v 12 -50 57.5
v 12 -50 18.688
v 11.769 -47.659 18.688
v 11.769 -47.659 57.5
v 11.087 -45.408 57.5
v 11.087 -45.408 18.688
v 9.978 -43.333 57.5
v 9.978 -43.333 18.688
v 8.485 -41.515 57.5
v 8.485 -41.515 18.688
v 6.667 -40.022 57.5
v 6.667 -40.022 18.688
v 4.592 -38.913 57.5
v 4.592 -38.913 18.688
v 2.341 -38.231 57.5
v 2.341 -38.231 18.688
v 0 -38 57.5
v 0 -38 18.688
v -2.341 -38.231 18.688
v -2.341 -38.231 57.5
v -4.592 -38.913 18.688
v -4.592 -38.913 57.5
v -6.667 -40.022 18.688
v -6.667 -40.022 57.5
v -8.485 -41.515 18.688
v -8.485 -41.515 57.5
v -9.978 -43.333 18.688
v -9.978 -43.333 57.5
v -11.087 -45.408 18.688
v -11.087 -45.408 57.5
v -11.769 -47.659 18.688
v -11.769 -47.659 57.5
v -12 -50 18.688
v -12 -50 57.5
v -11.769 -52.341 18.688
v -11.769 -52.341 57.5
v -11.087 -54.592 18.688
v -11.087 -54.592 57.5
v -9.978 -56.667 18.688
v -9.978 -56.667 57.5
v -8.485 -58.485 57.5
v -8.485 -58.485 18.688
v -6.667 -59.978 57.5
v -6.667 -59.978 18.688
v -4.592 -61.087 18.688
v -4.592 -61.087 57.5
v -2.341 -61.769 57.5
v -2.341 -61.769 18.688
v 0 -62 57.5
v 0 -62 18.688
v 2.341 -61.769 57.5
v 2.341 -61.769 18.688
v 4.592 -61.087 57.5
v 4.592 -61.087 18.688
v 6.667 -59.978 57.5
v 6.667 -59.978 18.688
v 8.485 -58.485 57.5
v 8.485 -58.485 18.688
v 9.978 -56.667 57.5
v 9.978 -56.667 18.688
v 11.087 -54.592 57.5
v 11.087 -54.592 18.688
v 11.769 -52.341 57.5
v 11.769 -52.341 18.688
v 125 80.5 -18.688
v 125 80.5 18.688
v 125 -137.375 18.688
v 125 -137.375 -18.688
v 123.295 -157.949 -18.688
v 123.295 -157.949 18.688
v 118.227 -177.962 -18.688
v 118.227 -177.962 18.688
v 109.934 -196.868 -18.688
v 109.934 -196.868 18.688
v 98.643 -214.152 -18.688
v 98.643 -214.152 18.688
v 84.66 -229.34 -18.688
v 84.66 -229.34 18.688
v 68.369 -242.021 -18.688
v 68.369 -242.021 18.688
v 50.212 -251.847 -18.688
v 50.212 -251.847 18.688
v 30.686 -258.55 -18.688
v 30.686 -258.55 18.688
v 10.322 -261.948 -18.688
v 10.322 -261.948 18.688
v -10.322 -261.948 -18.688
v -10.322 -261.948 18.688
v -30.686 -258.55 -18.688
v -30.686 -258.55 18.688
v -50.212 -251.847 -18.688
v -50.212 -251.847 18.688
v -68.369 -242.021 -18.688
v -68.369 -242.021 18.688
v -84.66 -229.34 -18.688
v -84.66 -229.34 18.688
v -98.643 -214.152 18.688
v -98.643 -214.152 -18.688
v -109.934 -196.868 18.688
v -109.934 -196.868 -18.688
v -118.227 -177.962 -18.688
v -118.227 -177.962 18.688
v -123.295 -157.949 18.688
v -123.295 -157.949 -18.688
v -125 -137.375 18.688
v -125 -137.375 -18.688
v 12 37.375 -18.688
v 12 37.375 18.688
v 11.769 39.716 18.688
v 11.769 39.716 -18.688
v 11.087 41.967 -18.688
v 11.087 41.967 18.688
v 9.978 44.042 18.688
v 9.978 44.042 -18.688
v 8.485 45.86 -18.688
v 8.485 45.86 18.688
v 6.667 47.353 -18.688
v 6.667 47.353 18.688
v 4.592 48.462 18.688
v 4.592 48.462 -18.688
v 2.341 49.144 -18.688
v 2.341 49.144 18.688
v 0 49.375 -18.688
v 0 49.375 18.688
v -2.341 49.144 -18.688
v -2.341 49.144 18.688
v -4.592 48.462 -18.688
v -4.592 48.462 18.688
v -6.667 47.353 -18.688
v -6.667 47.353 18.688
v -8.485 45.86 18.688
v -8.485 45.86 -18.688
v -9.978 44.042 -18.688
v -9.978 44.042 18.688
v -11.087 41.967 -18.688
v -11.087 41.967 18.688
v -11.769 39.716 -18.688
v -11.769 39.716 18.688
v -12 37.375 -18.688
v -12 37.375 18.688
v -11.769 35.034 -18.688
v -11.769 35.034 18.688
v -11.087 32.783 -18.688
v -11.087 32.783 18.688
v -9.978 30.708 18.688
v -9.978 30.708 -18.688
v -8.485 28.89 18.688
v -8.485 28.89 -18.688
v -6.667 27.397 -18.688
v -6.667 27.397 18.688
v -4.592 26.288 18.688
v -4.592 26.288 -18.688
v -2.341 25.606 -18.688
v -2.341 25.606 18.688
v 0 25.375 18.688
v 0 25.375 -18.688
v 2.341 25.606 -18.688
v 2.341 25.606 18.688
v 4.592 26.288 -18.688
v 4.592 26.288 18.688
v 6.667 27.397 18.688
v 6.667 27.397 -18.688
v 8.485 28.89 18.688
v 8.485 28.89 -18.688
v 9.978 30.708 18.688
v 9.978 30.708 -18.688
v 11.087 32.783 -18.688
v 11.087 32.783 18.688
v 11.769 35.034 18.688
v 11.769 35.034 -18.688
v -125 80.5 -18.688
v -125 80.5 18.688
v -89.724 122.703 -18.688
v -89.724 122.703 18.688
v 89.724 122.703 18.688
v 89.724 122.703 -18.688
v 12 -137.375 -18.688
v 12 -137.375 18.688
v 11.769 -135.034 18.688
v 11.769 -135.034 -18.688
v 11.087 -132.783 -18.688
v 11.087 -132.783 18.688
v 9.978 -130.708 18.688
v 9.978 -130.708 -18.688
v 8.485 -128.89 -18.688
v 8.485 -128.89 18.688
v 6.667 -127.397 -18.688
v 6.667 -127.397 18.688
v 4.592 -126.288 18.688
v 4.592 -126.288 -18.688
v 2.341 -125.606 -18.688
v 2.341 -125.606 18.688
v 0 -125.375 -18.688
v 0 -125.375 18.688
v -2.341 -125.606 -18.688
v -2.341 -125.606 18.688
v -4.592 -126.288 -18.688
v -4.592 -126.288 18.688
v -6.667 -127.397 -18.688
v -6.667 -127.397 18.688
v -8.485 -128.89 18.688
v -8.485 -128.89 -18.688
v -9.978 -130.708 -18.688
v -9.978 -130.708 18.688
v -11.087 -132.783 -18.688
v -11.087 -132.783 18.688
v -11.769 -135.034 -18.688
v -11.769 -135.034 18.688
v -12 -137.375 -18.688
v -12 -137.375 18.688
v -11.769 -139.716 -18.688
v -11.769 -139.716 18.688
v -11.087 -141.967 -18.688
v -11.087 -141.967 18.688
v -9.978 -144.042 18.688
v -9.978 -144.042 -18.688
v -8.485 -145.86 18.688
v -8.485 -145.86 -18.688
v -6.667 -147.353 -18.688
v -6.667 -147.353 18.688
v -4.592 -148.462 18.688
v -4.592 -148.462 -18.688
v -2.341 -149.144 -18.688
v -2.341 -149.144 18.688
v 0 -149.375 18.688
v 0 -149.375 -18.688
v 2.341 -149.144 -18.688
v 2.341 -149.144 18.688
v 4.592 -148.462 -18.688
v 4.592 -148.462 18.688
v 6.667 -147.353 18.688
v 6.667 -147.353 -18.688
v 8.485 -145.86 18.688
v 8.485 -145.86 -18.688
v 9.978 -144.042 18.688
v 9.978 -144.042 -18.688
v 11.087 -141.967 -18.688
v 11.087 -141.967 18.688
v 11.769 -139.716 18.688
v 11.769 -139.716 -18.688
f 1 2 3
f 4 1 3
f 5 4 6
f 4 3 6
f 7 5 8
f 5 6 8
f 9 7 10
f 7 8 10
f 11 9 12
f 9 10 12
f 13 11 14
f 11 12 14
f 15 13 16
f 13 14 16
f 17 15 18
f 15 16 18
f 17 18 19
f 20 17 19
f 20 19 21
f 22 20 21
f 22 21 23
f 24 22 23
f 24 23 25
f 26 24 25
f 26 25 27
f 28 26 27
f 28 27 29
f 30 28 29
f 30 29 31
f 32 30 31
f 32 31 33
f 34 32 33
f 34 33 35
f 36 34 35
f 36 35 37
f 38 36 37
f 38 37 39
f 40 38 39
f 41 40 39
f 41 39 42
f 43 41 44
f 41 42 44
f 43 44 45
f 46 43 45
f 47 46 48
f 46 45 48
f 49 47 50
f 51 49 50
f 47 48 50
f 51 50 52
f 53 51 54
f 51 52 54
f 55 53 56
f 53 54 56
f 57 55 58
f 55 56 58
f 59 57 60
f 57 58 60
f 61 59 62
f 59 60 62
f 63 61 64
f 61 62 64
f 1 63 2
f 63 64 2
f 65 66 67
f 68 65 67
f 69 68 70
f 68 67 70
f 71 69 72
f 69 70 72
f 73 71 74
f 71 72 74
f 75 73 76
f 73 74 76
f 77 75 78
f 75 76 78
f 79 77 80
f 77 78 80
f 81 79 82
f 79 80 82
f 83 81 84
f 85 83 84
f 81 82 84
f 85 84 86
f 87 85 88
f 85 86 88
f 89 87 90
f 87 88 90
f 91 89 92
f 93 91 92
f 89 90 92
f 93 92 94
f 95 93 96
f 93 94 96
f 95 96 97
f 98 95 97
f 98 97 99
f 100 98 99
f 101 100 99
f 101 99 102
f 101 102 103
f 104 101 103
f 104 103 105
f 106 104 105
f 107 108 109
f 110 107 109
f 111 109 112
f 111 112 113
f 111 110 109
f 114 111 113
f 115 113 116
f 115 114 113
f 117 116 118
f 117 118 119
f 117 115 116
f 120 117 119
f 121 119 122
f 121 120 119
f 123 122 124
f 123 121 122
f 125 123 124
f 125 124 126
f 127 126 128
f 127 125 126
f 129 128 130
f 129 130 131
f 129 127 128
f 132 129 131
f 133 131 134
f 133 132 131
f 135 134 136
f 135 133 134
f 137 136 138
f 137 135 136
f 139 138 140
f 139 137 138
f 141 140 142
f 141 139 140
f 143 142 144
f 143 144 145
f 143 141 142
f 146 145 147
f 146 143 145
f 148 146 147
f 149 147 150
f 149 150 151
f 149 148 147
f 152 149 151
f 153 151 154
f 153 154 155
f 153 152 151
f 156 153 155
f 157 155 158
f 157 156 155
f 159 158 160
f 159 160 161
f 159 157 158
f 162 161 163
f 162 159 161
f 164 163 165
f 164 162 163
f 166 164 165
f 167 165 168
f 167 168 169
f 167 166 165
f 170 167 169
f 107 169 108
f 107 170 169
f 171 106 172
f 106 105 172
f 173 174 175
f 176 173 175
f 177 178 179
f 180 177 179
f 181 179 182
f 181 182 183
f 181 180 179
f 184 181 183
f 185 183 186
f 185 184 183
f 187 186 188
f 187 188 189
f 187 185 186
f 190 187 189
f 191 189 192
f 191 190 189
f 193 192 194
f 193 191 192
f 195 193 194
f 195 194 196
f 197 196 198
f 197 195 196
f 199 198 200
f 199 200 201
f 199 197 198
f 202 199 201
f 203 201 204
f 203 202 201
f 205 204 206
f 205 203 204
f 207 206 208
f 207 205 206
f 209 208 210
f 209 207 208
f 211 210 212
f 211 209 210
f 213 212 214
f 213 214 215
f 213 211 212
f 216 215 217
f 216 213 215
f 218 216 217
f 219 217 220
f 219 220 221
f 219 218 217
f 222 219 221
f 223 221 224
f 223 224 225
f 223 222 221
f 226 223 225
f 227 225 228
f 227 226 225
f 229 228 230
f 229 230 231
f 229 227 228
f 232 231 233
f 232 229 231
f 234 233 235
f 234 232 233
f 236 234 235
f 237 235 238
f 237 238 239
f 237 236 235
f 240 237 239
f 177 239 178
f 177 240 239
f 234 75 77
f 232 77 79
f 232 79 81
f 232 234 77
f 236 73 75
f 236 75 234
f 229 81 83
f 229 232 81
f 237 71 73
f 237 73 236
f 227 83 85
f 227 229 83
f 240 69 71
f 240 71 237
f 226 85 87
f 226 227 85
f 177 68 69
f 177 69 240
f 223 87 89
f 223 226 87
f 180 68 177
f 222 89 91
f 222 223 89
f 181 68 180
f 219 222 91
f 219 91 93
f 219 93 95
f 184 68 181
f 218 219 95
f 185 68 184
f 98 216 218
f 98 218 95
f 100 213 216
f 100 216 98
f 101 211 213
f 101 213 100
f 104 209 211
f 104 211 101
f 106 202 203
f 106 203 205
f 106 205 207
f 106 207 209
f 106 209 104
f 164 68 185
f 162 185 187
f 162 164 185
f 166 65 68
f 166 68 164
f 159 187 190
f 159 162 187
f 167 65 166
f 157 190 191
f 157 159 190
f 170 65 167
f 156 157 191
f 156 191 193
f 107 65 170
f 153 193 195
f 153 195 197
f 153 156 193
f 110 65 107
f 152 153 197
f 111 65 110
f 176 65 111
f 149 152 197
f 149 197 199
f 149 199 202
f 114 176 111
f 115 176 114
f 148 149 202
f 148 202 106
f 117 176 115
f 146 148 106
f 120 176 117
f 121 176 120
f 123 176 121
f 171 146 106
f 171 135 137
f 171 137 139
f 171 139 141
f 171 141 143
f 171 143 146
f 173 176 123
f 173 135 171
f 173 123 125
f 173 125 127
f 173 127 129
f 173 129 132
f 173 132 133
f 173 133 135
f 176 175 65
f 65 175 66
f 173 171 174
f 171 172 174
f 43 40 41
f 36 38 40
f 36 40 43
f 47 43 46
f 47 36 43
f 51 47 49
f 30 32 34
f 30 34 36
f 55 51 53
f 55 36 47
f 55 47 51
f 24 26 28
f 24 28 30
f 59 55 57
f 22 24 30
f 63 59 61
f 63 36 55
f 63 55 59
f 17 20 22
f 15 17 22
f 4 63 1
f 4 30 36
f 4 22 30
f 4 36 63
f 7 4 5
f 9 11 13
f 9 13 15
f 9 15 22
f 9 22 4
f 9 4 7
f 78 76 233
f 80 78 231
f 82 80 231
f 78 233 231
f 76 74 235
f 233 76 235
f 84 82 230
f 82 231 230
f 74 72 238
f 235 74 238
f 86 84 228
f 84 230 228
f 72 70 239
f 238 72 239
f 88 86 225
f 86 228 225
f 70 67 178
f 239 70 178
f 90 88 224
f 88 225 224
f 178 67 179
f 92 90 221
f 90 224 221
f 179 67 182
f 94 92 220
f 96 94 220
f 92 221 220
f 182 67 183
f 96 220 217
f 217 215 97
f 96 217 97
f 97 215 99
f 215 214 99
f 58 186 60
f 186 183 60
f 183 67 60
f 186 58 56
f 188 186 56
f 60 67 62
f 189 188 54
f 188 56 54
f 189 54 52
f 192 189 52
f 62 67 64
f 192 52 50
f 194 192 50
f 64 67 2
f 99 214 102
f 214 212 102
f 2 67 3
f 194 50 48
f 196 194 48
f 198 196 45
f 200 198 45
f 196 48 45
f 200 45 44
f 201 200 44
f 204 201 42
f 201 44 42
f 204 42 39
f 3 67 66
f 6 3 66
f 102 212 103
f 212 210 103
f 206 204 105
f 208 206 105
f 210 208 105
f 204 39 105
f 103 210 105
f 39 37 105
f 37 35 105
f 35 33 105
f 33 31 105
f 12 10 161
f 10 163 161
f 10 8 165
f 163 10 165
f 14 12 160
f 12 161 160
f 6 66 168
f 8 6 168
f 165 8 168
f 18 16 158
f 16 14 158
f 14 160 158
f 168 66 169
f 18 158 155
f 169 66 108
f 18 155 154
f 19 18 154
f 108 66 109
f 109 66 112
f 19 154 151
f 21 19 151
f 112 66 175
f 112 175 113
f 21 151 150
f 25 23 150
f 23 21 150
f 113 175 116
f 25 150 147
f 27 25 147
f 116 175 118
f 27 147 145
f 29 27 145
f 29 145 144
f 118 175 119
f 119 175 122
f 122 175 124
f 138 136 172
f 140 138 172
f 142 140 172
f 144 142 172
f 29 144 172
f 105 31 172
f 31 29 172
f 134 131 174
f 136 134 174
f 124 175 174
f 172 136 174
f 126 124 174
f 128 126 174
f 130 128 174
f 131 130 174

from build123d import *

# Parameters (mm, degrees)
SKETCH1_R           = 12
BOSS_EXTRUDE1_DEPTH = 18.6875
SKETCH1_4_R         = 12
BOSS_EXTRUDE2_DEPTH = 57.5


with BuildPart() as part:
    # Sketch1 → Boss-Extrude1 (new, symmetric)
    with BuildSketch(Plane.XY):
        with BuildLine():
            Line((125, -137.375), (125, 80.499531502))
            Line((125, 80.499531502), (89.723613553, 122.703318674))
            Line((89.723613553, 122.703318674), (-89.72361368, 122.703318674))
            Line((-89.72361368, 122.703318674), (-125, 80.499531502))
            Line((-125, 80.499531502), (-125, -137.375))
            ThreePointArc((-125, -137.375), (0, -262.375), (125, -137.375))
        make_face()
        with Locations((0, -137.375)):
            Circle(SKETCH1_R, mode=Mode.SUBTRACT)
        with Locations((0, 37.375)):
            Circle(SKETCH1_R, mode=Mode.SUBTRACT)
    extrude(amount=BOSS_EXTRUDE1_DEPTH, both=True)

    # Sketch1<4> → Boss-Extrude2 (add)
    with BuildSketch(Plane.XY):
        with Locations((0, -50)):
            Circle(SKETCH1_4_R)
    extrude(amount=BOSS_EXTRUDE2_DEPTH)


solid = part.part
